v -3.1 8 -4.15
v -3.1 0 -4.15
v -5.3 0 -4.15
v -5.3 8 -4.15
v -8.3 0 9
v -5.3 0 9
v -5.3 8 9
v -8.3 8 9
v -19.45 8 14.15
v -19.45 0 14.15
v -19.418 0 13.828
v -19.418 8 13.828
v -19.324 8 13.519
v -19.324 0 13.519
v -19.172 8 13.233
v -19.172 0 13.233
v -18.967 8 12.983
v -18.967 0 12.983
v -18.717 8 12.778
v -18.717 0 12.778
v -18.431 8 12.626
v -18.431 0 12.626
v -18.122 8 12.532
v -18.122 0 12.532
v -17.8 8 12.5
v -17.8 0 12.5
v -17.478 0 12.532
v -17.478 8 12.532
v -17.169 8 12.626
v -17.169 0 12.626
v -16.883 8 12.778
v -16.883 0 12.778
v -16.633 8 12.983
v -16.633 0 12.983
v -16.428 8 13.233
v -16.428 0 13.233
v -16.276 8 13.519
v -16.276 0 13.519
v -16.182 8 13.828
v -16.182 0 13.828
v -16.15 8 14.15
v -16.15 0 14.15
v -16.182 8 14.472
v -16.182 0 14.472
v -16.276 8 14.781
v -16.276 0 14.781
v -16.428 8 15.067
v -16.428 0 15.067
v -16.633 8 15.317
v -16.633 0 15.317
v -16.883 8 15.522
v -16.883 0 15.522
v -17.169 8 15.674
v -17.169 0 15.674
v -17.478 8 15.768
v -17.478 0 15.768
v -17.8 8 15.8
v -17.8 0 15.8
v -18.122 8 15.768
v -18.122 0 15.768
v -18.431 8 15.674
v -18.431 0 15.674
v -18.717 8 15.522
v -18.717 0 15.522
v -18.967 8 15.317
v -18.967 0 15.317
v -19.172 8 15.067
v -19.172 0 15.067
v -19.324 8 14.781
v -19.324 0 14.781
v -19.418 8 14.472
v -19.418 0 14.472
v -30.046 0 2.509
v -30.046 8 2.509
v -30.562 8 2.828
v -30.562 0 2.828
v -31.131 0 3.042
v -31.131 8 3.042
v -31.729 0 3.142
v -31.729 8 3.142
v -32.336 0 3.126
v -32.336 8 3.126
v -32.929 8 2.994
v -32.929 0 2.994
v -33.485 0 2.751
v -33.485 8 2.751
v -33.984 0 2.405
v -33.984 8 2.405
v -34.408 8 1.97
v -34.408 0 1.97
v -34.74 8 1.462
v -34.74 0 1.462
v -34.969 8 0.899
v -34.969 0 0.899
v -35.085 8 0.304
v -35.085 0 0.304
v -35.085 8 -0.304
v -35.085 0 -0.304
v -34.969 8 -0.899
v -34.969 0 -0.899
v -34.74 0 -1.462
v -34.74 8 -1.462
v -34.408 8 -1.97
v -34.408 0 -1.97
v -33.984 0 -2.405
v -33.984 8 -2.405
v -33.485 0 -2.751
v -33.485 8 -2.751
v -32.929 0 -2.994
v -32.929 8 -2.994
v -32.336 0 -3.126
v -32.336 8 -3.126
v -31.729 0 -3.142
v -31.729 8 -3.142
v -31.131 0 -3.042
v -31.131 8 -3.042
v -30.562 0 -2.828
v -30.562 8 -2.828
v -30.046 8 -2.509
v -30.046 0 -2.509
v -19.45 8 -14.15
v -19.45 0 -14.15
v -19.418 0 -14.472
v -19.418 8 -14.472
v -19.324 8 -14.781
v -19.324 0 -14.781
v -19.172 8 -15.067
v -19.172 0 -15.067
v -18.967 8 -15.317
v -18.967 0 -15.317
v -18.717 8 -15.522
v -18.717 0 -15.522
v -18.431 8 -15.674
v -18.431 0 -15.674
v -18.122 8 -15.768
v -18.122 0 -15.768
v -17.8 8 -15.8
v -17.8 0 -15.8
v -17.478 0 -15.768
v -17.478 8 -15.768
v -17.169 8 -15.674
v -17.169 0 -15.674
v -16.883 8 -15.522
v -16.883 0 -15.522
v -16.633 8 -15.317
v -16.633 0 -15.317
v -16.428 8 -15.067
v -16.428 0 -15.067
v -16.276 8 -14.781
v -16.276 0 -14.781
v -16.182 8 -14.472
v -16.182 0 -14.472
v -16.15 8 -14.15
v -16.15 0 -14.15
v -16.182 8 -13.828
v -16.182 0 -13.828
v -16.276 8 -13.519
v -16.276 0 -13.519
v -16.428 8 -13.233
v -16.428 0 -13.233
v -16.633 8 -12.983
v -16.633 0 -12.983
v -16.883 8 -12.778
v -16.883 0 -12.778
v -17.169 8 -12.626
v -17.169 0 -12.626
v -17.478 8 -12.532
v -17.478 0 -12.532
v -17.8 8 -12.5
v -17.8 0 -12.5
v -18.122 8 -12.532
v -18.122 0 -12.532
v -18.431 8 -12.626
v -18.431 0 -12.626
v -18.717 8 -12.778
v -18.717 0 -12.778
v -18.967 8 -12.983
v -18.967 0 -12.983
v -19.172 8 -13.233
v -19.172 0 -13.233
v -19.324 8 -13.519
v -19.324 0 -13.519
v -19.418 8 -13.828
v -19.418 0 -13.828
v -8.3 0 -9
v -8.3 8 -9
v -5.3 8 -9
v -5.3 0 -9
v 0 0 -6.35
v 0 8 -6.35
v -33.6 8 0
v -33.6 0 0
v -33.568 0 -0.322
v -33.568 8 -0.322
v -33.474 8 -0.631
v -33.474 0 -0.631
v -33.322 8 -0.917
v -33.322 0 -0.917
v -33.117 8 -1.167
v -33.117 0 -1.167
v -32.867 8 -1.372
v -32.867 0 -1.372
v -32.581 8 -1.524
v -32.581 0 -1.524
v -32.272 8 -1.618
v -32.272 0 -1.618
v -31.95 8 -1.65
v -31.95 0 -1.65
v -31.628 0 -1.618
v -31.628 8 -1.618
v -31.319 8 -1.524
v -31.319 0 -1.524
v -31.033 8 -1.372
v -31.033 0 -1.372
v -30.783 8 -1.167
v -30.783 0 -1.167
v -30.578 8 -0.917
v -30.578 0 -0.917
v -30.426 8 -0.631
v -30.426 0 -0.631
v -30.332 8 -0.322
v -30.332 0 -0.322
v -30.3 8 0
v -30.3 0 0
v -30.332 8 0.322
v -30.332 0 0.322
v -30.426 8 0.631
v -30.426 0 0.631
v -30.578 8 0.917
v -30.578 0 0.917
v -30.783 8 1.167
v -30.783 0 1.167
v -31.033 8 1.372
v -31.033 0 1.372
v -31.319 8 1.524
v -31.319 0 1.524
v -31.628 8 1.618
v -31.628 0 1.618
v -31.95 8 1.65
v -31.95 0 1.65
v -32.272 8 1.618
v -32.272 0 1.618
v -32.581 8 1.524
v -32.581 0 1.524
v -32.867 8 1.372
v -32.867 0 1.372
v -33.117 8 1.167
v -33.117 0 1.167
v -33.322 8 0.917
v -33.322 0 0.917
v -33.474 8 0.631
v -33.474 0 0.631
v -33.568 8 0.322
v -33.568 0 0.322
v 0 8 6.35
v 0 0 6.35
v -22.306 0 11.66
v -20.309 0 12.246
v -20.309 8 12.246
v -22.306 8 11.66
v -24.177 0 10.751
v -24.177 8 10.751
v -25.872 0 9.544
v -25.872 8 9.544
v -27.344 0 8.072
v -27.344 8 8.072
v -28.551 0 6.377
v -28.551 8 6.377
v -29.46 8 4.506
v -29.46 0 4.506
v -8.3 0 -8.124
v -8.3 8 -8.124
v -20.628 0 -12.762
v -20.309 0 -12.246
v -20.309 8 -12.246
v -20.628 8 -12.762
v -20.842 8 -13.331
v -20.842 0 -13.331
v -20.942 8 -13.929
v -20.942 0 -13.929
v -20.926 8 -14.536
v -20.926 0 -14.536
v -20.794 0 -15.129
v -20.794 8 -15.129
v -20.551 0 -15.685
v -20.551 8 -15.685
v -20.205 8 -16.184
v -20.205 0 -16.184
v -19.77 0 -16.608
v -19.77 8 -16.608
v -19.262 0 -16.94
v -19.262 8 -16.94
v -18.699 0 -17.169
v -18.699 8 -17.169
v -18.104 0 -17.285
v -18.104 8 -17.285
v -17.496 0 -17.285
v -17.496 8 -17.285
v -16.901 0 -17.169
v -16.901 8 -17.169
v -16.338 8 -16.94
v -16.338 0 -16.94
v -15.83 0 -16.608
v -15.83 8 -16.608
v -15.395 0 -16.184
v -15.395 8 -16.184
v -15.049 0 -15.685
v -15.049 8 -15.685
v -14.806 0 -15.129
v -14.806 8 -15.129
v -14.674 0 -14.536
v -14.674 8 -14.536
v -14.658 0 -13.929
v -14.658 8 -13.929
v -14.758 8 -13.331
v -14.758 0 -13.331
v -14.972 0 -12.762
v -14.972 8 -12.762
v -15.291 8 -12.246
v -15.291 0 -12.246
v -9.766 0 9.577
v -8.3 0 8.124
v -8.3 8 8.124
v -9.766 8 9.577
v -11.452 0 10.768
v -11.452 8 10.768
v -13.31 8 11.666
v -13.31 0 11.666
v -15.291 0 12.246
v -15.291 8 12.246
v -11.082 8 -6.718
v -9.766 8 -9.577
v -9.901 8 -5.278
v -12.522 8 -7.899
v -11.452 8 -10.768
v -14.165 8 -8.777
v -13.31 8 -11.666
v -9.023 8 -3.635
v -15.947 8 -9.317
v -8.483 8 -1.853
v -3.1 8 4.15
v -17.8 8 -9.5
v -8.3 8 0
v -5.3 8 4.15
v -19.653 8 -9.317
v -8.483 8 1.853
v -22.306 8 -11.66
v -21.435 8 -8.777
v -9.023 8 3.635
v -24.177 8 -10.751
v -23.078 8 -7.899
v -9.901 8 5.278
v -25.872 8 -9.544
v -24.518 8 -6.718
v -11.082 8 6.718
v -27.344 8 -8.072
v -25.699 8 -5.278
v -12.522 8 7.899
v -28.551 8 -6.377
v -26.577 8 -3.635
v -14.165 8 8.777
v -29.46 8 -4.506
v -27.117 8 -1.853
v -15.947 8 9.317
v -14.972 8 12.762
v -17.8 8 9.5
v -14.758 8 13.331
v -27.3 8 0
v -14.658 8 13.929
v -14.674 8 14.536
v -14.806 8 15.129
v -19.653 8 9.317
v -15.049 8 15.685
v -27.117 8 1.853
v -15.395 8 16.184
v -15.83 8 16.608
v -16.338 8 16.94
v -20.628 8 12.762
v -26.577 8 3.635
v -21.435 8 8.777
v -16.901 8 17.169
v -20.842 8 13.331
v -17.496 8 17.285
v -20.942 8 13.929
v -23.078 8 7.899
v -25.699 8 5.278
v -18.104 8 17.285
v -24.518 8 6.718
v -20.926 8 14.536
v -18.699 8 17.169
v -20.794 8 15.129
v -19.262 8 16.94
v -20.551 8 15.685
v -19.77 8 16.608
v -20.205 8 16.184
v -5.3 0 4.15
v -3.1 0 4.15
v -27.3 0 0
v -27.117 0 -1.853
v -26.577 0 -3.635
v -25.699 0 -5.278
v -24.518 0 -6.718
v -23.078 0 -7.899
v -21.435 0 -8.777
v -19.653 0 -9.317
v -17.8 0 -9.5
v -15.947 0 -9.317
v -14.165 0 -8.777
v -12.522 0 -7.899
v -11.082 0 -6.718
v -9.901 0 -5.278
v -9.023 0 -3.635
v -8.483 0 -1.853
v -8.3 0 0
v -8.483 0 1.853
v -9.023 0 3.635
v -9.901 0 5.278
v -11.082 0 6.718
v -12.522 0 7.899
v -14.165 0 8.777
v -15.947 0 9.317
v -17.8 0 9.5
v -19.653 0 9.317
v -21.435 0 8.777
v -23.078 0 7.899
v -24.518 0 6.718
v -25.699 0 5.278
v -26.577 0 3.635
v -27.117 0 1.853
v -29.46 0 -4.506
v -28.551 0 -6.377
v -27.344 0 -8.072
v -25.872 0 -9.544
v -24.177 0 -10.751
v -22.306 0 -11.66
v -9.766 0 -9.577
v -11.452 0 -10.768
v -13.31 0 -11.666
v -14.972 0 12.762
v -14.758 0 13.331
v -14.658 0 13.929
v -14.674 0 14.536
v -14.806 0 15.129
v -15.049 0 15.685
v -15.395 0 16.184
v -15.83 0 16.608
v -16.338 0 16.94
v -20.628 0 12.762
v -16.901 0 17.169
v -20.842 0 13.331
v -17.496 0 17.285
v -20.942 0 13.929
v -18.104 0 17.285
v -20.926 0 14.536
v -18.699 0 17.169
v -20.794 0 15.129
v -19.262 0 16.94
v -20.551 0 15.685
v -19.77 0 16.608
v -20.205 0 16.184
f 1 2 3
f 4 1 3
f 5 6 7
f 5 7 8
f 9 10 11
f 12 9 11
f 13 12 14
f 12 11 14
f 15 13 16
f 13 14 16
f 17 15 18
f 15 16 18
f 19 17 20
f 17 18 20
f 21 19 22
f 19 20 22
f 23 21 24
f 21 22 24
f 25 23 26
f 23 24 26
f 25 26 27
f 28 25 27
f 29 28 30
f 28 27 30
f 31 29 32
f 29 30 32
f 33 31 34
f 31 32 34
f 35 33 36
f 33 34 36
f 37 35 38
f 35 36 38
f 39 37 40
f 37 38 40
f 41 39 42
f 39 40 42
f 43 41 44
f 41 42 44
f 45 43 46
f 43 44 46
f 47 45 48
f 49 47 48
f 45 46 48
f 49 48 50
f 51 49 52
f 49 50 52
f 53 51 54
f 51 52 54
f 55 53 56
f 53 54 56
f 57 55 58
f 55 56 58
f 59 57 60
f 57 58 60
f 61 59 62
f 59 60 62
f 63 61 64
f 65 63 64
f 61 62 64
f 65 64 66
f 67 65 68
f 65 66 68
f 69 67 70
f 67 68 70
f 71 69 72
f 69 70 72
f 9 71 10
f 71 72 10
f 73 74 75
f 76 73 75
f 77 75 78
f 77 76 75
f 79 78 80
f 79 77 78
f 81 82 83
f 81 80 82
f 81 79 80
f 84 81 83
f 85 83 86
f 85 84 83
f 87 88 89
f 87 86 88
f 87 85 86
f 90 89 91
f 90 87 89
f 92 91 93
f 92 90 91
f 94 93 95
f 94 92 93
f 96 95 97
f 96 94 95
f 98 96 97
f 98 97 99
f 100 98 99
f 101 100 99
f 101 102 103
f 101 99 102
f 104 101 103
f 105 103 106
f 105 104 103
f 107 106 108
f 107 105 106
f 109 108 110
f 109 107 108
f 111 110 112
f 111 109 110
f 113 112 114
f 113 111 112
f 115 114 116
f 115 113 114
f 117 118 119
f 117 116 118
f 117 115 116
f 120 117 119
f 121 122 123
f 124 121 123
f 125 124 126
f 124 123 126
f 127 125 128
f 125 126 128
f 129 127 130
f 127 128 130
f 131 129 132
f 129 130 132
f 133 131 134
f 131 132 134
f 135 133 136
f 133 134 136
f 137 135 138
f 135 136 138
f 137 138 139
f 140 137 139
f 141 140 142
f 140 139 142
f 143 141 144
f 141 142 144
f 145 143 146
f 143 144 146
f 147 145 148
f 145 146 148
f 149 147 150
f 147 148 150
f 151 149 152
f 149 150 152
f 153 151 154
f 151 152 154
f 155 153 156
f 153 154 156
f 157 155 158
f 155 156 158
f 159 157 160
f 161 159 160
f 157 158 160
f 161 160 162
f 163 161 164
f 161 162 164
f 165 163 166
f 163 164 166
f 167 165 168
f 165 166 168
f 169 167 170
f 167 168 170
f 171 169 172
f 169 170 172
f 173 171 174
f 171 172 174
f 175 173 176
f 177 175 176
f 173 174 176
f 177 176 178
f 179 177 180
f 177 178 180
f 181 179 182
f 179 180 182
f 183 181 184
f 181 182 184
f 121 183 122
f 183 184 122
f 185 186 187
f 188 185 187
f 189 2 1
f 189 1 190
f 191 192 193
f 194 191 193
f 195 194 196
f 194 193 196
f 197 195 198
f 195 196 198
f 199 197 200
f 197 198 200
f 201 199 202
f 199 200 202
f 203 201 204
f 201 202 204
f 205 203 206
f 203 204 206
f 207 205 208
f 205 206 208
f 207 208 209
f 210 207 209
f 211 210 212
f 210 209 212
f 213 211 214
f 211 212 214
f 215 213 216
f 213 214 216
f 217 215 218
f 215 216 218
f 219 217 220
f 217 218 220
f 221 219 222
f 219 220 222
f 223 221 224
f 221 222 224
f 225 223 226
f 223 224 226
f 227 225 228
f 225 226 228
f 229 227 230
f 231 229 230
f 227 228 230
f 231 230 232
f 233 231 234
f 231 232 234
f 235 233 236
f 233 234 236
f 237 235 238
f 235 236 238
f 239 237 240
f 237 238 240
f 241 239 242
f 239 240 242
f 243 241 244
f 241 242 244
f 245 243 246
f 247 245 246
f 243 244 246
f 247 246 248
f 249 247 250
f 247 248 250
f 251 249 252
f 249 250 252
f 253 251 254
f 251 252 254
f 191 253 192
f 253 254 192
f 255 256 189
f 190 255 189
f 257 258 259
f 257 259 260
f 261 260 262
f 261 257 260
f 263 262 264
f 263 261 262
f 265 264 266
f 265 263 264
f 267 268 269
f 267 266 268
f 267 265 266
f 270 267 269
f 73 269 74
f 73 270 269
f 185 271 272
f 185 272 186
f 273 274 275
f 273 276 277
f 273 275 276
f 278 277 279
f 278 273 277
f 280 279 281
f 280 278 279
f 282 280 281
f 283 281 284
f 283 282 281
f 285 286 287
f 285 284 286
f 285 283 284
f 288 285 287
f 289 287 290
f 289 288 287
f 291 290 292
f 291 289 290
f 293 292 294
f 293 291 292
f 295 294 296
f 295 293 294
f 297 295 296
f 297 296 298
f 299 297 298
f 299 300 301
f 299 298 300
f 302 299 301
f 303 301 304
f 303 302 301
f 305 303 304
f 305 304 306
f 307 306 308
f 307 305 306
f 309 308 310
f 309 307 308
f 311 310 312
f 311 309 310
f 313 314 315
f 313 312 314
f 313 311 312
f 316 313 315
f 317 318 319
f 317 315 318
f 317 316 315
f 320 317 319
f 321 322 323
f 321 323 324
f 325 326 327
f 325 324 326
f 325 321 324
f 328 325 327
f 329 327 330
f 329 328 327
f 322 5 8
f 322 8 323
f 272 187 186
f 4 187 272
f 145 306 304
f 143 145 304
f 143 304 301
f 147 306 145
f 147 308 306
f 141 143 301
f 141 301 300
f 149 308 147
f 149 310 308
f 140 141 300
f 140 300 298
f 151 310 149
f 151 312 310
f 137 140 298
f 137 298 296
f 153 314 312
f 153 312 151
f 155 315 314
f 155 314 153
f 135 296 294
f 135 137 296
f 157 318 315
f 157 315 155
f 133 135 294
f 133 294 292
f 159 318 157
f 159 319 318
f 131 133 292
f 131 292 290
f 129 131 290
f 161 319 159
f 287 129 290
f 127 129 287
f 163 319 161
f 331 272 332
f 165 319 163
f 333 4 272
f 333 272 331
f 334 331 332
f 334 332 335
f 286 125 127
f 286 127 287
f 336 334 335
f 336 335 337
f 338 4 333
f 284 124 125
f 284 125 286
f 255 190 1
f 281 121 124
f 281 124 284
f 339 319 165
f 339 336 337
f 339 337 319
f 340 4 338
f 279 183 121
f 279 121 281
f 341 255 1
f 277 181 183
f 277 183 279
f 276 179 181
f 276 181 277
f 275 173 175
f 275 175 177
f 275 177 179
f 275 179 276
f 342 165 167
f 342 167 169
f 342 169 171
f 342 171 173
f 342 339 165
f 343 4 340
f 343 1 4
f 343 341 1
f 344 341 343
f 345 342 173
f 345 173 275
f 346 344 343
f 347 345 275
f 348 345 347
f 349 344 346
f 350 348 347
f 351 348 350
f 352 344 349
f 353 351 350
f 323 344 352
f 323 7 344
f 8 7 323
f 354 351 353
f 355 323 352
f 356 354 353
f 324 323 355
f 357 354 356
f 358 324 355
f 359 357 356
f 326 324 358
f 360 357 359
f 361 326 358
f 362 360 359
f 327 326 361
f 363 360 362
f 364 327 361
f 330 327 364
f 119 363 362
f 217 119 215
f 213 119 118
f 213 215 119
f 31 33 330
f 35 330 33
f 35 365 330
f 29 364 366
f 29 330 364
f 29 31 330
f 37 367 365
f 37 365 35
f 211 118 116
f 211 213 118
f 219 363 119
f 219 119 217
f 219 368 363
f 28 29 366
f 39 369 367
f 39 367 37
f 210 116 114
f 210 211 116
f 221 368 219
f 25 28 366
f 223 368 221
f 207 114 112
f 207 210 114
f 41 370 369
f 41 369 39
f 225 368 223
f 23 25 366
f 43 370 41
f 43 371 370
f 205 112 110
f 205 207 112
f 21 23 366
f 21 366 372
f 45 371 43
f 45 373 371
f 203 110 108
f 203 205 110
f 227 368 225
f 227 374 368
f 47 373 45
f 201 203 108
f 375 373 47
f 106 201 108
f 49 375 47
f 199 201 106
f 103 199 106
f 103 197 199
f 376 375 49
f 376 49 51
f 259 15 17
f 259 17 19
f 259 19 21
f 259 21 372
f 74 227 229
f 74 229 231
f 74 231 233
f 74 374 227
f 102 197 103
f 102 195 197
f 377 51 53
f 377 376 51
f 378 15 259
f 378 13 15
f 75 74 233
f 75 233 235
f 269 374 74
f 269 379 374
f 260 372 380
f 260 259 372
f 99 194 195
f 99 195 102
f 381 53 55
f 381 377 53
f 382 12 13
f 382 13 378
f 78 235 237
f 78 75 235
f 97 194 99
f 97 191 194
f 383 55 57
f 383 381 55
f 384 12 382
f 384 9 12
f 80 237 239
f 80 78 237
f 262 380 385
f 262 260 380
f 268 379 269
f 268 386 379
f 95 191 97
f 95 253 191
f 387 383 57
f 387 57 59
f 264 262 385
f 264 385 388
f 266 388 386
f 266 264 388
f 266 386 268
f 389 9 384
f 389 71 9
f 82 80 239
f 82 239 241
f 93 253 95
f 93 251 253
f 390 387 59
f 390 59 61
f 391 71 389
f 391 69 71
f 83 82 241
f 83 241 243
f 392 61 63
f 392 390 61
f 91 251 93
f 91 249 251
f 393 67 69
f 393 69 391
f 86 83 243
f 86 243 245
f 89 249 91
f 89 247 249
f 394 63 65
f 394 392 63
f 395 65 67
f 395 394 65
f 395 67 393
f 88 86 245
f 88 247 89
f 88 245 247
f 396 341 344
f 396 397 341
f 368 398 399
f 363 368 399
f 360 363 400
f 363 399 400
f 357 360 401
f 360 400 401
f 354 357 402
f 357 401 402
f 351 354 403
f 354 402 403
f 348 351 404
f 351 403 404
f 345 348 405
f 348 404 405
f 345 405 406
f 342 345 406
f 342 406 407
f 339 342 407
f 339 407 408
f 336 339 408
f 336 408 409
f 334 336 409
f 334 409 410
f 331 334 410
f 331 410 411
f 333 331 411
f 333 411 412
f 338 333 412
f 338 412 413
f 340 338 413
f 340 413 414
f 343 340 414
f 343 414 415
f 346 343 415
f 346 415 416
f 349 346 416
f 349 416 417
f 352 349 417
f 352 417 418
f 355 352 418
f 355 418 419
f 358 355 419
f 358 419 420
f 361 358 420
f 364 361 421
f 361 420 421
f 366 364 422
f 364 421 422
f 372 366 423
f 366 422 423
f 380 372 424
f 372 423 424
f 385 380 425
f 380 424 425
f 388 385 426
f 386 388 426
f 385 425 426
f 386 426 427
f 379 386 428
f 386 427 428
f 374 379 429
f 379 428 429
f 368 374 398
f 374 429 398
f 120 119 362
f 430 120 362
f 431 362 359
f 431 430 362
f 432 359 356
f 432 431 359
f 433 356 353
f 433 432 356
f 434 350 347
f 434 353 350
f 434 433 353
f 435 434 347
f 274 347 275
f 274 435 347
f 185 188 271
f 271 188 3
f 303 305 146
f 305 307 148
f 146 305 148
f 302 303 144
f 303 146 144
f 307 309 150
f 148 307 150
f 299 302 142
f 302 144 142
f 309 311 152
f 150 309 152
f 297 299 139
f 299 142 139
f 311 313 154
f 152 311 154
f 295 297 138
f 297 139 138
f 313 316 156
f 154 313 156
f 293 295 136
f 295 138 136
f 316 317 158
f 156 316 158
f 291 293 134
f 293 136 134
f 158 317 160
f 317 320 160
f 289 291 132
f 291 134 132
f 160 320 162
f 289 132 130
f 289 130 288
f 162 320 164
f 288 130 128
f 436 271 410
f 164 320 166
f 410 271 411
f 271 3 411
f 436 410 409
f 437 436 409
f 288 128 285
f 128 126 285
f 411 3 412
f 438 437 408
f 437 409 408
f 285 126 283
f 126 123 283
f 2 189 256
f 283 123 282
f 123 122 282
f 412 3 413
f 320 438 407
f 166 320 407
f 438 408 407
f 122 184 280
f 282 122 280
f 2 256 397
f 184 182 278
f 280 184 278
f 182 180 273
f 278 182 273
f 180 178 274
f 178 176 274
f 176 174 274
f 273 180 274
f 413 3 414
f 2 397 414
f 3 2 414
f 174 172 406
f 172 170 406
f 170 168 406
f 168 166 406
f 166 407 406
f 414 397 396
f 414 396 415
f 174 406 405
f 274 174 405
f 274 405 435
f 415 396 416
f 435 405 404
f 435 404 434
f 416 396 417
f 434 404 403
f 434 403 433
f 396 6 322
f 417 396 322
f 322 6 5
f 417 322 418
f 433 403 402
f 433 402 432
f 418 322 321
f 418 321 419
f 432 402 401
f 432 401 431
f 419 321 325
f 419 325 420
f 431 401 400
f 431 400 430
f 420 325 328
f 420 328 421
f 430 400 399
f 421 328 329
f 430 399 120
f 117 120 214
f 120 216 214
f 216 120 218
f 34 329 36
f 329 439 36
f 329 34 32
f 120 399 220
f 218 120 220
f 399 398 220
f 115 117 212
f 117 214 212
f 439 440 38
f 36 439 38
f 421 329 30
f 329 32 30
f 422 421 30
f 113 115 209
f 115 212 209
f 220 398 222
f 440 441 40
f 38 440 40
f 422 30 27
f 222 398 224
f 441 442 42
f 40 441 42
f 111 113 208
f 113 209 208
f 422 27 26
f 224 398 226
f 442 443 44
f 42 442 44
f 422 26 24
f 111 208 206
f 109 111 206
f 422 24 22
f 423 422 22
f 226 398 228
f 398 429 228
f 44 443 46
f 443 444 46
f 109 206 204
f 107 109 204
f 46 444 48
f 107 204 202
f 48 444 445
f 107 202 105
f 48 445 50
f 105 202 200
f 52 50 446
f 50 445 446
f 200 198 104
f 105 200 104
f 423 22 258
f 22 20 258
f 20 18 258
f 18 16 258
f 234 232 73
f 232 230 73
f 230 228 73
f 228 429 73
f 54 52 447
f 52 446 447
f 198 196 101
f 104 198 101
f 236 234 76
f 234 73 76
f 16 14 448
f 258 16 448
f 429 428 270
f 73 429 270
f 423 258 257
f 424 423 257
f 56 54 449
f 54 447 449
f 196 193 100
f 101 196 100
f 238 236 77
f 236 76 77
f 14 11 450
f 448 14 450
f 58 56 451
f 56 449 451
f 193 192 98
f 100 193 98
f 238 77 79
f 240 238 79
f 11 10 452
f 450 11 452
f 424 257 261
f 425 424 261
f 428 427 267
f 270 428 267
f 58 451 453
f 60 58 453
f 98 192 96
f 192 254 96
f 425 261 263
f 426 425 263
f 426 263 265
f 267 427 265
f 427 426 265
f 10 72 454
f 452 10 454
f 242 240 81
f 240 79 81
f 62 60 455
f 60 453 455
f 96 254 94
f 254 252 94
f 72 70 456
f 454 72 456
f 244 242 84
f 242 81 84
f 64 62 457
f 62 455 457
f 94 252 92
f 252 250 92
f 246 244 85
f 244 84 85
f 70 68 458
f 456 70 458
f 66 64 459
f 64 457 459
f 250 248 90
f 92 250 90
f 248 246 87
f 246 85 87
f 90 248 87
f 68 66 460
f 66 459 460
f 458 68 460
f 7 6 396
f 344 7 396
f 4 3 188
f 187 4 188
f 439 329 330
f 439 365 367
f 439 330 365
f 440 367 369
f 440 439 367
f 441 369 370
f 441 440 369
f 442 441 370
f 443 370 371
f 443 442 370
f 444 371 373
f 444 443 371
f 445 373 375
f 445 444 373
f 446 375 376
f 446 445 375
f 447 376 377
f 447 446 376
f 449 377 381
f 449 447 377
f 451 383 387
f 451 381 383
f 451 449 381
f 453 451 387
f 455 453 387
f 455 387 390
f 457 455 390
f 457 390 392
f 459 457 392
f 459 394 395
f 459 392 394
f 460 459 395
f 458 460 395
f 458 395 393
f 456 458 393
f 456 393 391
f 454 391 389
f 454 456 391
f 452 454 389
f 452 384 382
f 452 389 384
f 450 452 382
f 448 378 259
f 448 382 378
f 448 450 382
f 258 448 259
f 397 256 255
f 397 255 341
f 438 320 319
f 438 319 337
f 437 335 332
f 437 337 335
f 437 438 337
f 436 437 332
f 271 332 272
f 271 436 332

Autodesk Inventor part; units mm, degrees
ref_plane "YZ Plane" through (0, 0, 0) normal (1, 0, 0) x (0, 1, 0)
ref_plane "XZ Plane" through (0, 0, 0) normal (0, 1, 0) x (-1, 0, 0)
ref_plane "XY Plane" through (0, 0, 0) normal (0, 0, 1) x (1, 0, 0)
sketch "Boceto1" plane through (0, 0, 0) normal (0, 1, 0) x (-1, 0, 0)
  line L0 (0, 6.35) -> (0, -6.35)
  line L1 (3.1, 4.15) -> (3.1, -4.15)
  line L2 (0, 6.35) -> (3.1, 4.15)
  line L3 (3.1, -4.15) -> (0, -6.35)
  line L4 (3.1, 4.15) -> (5.3, 4.15)
  line L5 (-4.6452, 0) -> (17.8, 0) construction
  line L6 (3.1, -4.15) -> (5.3, -4.15)
  line L7 (5.3, 9) -> (5.3, -9)
  line L8 (5.3, 9) -> (8.3, 9)
  line L9 (8.3, 9) -> (8.3, -9)
  line L10 (8.3, -9) -> (5.3, -9)
  line L11 (5.3, -9) -> (5.3, 9)
  circle A0 centre (17.8, 0) radius 9.5
  circle A1 centre (17.8, 0) radius 12.5
  circle A2 centre (31.95, 0) radius 1.65
  circle A3 centre (31.95, 0) radius 3.15
  circle A4 centre (17.8, 14.15) radius 3.15
  circle A5 centre (17.8, 14.15) radius 1.65
  circle A6 centre (17.8, -14.15) radius 3.15
  circle A7 centre (17.8, -14.15) radius 1.65
  point P0 (0, 0)
  point P1 (0, 0)
  point P2 (3.1, 0)
  point P3 (5.3, 0)
  point P4 (5.3, 0)
  point P5 (30.3, 0)
  point P6 (17.8, -12.5)
  point P7 (17.8, 12.5)
  point P8 (30.0456, 2.5091)
  point P9 (20.3091, 12.2456)
  point P10 (15.2909, 12.2456)
  point P11 (8.3, 8.124)
  point P12 (8.3, -8.124)
  point P13 (15.2909, -12.2456)
  point P14 (20.3091, -12.2456)
  point P15 (30.0456, -2.5091)
  dimension "d0" = 12.7
  dimension "d1" = 8.3
  dimension "d2" = 3.1
  dimension "d3" = 2.2
  dimension "d4" = 18
  dimension "d5" = 3
  dimension "d6" = 19
  dimension "d7" = 25
  dimension "d8" = 3.3
  dimension "d9" = 6.3
  dimension "d12" = 90
  dimension "d16" = 90
extrude "Extrusión1" add sketch "Boceto1" along normal blind 8
properties part number "acople_v2_3DPrint"
